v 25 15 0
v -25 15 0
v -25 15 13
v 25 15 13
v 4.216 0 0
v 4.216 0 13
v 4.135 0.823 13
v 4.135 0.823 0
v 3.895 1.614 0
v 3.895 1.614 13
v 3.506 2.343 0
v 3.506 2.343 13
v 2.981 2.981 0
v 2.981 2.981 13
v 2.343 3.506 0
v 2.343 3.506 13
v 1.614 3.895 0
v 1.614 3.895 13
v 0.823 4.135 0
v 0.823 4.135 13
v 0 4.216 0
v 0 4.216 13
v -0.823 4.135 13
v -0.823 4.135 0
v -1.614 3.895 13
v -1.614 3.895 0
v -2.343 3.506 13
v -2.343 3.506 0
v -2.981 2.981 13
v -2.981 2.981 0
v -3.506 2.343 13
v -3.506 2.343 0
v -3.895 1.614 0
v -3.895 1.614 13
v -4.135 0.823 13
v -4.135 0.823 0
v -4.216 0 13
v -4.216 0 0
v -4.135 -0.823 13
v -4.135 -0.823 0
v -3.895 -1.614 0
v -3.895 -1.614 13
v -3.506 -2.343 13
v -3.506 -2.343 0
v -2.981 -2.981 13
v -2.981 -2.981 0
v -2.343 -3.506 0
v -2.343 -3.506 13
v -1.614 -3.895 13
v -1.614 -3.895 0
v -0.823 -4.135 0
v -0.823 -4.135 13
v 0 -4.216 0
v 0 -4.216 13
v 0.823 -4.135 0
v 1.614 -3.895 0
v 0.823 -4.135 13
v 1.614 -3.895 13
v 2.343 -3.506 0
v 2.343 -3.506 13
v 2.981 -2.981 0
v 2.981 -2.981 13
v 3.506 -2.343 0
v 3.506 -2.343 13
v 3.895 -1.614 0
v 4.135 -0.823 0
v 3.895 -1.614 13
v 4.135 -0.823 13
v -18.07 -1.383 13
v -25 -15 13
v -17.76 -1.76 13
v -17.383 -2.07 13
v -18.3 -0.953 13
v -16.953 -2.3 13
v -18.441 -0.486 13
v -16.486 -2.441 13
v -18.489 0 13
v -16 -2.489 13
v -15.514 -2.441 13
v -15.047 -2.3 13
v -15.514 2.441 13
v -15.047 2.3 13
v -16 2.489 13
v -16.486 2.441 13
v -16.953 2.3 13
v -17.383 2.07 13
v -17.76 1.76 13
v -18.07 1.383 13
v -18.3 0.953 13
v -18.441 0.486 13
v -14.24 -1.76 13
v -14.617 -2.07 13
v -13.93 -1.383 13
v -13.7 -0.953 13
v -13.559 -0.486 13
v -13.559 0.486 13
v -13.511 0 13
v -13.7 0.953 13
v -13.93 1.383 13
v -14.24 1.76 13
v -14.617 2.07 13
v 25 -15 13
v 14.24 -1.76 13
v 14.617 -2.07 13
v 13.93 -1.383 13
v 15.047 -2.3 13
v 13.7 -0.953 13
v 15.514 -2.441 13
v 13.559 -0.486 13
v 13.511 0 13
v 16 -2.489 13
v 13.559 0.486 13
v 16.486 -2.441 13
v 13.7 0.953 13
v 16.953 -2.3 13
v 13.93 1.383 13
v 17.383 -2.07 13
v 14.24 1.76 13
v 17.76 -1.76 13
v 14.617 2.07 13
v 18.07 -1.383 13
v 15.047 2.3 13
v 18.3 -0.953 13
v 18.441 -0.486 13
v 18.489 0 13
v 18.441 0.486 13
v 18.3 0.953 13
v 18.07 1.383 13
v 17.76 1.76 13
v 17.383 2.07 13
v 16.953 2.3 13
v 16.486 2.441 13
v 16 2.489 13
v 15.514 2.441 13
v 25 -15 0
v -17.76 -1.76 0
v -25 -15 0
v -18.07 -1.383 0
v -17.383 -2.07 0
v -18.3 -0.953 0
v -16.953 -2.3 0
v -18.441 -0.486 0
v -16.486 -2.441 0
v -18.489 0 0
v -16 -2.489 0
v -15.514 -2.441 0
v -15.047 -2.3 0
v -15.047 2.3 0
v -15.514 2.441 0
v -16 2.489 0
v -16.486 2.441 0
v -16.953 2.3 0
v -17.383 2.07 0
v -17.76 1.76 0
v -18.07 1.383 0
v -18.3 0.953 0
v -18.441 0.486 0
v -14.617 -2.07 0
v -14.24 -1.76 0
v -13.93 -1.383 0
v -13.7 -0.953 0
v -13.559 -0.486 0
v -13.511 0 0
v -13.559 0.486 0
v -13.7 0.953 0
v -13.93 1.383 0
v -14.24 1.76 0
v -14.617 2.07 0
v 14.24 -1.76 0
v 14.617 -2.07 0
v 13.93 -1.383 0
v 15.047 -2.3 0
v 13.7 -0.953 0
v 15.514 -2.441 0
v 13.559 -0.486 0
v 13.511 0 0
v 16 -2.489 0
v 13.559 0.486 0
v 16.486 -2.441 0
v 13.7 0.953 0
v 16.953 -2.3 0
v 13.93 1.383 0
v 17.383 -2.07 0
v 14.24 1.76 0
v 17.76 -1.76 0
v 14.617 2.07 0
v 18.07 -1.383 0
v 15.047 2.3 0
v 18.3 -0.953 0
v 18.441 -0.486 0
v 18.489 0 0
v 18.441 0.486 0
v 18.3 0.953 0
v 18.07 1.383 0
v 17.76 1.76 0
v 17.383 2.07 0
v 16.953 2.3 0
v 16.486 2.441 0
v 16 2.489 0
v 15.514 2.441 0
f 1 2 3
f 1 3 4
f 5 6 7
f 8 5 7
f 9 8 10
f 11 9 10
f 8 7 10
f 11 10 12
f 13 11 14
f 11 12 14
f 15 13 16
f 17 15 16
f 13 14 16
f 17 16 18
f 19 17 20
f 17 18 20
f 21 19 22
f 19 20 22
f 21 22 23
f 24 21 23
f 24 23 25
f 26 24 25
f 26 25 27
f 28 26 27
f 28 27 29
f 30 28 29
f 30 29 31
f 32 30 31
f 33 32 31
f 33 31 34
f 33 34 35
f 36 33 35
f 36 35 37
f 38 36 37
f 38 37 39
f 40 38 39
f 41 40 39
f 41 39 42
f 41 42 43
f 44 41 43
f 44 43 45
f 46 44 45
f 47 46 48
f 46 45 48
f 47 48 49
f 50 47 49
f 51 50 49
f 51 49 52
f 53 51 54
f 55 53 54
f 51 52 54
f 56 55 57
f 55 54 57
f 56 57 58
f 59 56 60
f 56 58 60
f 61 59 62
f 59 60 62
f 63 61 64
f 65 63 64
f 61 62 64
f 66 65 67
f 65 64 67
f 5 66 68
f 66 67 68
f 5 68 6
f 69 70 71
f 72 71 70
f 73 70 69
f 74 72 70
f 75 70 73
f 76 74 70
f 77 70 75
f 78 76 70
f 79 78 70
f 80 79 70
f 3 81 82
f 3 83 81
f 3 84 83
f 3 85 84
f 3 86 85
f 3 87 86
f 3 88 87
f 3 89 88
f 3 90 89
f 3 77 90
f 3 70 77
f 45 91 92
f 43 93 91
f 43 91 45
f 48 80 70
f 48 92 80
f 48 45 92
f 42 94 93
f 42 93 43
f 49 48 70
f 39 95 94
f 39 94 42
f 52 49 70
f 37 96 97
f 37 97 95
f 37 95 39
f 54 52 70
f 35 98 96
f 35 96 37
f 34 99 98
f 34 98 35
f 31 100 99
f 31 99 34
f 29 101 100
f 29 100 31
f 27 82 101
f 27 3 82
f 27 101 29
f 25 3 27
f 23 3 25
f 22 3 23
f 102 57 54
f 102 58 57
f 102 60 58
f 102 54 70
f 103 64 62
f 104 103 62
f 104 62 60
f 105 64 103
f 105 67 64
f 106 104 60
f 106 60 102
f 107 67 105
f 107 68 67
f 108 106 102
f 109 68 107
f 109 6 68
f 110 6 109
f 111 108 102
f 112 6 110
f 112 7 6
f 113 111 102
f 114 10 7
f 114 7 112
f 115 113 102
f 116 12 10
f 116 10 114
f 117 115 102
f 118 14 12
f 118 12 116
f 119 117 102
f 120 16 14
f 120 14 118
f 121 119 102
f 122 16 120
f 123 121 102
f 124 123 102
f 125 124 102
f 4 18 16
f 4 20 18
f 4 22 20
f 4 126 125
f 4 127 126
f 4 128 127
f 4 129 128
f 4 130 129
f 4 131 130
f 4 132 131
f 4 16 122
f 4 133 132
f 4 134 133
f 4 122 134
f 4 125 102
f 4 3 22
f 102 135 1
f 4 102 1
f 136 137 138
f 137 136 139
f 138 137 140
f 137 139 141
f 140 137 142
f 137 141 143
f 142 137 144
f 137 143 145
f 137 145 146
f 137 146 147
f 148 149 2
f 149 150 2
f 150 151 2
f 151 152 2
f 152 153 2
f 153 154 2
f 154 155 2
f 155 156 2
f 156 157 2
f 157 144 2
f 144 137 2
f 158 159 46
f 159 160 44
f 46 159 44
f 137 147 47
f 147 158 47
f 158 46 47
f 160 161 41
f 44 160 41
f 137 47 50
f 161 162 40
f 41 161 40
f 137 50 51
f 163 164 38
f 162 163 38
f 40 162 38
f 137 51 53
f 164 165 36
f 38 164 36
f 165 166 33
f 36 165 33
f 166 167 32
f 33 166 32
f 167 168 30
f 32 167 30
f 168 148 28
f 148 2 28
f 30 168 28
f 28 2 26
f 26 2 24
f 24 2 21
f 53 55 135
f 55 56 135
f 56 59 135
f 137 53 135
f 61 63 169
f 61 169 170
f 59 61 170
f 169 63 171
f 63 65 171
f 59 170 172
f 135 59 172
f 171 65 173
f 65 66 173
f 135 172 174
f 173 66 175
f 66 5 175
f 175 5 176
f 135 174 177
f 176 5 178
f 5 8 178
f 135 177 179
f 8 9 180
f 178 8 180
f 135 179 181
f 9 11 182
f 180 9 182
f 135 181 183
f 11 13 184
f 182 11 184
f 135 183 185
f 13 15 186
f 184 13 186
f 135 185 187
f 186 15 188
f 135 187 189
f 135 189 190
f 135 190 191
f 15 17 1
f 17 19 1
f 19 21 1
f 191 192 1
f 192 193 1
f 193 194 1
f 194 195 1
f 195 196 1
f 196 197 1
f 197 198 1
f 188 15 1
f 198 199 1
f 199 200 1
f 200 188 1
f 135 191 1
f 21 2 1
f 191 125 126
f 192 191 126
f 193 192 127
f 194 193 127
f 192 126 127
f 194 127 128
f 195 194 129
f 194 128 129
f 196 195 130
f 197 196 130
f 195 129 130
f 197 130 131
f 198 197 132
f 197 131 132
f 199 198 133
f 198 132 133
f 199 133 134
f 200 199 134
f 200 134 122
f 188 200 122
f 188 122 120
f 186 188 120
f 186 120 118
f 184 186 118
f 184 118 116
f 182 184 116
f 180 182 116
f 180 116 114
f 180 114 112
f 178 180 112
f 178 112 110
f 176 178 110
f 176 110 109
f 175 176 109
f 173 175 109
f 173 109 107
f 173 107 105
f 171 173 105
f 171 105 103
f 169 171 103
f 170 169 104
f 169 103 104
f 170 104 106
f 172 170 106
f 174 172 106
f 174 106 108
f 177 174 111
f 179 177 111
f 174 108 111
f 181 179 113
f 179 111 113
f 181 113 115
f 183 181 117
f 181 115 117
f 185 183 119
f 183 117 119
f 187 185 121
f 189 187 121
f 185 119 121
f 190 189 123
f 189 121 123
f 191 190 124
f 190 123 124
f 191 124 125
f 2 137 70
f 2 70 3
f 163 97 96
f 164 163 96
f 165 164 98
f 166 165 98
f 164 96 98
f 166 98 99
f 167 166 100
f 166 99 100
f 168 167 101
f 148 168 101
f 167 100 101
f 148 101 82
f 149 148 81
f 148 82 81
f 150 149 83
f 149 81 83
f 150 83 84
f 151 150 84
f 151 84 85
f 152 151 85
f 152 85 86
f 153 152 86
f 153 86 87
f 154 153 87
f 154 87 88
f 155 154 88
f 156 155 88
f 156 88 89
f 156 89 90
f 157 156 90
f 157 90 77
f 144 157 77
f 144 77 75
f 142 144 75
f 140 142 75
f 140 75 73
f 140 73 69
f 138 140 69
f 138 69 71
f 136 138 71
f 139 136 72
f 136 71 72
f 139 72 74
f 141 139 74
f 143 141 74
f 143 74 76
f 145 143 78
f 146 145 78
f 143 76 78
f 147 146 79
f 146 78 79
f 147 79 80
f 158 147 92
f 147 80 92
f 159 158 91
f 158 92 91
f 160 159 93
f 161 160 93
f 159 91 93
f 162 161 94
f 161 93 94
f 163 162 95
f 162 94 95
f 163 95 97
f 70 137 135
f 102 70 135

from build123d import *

# Parameters (mm, degrees)
SKETCH1_W                             = 50
SKETCH1_H                             = 30
BOSS_EXTRUDE1_DEPTH                   = 13
TAP_DRILL_FOR_5_16_18_HELICOIL1_D     = 8.4328
TAP_DRILL_FOR_5_16_18_HELICOIL1_DEPTH = 129.53
TAP_DRILL_FOR_5_16_18_HELICOIL1_TIP   = 2.533468714
F_10_CLEARANCE_HOLE1_D                = 4.9784
F_10_CLEARANCE_HOLE1_DEPTH            = 129.53
F_10_CLEARANCE_HOLE1_TIP              = 1.495662253


with BuildPart() as part:
    # Sketch1 → Boss-Extrude1 (new body)
    with BuildSketch(Plane.XY):
        Rectangle(SKETCH1_W, SKETCH1_H)
    extrude(amount=BOSS_EXTRUDE1_DEPTH)

    # Tap Drill for 5/16-18 Helicoil1
    with Locations(Plane(origin=(0, 0, 0), x_dir=(-1, 0, 0), z_dir=(0, 0, -1))):
        with Locations((0, 0)):
            Hole(TAP_DRILL_FOR_5_16_18_HELICOIL1_D / 2, depth=TAP_DRILL_FOR_5_16_18_HELICOIL1_DEPTH)
            with Locations((0, 0, -(TAP_DRILL_FOR_5_16_18_HELICOIL1_DEPTH + TAP_DRILL_FOR_5_16_18_HELICOIL1_TIP / 2))):  # 118° drill point
                Cone(0, TAP_DRILL_FOR_5_16_18_HELICOIL1_D / 2, TAP_DRILL_FOR_5_16_18_HELICOIL1_TIP, mode=Mode.SUBTRACT)

    # #10 Clearance Hole1
    with Locations(Plane(origin=(0, 0, 0), x_dir=(-1, 0, 0), z_dir=(0, 0, -1))):
        with Locations((-16, 0), (16, 0)):
            Hole(F_10_CLEARANCE_HOLE1_D / 2, depth=F_10_CLEARANCE_HOLE1_DEPTH)
            with Locations((0, 0, -(F_10_CLEARANCE_HOLE1_DEPTH + F_10_CLEARANCE_HOLE1_TIP / 2))):  # 118° drill point
                Cone(0, F_10_CLEARANCE_HOLE1_D / 2, F_10_CLEARANCE_HOLE1_TIP, mode=Mode.SUBTRACT)


solid = part.part
